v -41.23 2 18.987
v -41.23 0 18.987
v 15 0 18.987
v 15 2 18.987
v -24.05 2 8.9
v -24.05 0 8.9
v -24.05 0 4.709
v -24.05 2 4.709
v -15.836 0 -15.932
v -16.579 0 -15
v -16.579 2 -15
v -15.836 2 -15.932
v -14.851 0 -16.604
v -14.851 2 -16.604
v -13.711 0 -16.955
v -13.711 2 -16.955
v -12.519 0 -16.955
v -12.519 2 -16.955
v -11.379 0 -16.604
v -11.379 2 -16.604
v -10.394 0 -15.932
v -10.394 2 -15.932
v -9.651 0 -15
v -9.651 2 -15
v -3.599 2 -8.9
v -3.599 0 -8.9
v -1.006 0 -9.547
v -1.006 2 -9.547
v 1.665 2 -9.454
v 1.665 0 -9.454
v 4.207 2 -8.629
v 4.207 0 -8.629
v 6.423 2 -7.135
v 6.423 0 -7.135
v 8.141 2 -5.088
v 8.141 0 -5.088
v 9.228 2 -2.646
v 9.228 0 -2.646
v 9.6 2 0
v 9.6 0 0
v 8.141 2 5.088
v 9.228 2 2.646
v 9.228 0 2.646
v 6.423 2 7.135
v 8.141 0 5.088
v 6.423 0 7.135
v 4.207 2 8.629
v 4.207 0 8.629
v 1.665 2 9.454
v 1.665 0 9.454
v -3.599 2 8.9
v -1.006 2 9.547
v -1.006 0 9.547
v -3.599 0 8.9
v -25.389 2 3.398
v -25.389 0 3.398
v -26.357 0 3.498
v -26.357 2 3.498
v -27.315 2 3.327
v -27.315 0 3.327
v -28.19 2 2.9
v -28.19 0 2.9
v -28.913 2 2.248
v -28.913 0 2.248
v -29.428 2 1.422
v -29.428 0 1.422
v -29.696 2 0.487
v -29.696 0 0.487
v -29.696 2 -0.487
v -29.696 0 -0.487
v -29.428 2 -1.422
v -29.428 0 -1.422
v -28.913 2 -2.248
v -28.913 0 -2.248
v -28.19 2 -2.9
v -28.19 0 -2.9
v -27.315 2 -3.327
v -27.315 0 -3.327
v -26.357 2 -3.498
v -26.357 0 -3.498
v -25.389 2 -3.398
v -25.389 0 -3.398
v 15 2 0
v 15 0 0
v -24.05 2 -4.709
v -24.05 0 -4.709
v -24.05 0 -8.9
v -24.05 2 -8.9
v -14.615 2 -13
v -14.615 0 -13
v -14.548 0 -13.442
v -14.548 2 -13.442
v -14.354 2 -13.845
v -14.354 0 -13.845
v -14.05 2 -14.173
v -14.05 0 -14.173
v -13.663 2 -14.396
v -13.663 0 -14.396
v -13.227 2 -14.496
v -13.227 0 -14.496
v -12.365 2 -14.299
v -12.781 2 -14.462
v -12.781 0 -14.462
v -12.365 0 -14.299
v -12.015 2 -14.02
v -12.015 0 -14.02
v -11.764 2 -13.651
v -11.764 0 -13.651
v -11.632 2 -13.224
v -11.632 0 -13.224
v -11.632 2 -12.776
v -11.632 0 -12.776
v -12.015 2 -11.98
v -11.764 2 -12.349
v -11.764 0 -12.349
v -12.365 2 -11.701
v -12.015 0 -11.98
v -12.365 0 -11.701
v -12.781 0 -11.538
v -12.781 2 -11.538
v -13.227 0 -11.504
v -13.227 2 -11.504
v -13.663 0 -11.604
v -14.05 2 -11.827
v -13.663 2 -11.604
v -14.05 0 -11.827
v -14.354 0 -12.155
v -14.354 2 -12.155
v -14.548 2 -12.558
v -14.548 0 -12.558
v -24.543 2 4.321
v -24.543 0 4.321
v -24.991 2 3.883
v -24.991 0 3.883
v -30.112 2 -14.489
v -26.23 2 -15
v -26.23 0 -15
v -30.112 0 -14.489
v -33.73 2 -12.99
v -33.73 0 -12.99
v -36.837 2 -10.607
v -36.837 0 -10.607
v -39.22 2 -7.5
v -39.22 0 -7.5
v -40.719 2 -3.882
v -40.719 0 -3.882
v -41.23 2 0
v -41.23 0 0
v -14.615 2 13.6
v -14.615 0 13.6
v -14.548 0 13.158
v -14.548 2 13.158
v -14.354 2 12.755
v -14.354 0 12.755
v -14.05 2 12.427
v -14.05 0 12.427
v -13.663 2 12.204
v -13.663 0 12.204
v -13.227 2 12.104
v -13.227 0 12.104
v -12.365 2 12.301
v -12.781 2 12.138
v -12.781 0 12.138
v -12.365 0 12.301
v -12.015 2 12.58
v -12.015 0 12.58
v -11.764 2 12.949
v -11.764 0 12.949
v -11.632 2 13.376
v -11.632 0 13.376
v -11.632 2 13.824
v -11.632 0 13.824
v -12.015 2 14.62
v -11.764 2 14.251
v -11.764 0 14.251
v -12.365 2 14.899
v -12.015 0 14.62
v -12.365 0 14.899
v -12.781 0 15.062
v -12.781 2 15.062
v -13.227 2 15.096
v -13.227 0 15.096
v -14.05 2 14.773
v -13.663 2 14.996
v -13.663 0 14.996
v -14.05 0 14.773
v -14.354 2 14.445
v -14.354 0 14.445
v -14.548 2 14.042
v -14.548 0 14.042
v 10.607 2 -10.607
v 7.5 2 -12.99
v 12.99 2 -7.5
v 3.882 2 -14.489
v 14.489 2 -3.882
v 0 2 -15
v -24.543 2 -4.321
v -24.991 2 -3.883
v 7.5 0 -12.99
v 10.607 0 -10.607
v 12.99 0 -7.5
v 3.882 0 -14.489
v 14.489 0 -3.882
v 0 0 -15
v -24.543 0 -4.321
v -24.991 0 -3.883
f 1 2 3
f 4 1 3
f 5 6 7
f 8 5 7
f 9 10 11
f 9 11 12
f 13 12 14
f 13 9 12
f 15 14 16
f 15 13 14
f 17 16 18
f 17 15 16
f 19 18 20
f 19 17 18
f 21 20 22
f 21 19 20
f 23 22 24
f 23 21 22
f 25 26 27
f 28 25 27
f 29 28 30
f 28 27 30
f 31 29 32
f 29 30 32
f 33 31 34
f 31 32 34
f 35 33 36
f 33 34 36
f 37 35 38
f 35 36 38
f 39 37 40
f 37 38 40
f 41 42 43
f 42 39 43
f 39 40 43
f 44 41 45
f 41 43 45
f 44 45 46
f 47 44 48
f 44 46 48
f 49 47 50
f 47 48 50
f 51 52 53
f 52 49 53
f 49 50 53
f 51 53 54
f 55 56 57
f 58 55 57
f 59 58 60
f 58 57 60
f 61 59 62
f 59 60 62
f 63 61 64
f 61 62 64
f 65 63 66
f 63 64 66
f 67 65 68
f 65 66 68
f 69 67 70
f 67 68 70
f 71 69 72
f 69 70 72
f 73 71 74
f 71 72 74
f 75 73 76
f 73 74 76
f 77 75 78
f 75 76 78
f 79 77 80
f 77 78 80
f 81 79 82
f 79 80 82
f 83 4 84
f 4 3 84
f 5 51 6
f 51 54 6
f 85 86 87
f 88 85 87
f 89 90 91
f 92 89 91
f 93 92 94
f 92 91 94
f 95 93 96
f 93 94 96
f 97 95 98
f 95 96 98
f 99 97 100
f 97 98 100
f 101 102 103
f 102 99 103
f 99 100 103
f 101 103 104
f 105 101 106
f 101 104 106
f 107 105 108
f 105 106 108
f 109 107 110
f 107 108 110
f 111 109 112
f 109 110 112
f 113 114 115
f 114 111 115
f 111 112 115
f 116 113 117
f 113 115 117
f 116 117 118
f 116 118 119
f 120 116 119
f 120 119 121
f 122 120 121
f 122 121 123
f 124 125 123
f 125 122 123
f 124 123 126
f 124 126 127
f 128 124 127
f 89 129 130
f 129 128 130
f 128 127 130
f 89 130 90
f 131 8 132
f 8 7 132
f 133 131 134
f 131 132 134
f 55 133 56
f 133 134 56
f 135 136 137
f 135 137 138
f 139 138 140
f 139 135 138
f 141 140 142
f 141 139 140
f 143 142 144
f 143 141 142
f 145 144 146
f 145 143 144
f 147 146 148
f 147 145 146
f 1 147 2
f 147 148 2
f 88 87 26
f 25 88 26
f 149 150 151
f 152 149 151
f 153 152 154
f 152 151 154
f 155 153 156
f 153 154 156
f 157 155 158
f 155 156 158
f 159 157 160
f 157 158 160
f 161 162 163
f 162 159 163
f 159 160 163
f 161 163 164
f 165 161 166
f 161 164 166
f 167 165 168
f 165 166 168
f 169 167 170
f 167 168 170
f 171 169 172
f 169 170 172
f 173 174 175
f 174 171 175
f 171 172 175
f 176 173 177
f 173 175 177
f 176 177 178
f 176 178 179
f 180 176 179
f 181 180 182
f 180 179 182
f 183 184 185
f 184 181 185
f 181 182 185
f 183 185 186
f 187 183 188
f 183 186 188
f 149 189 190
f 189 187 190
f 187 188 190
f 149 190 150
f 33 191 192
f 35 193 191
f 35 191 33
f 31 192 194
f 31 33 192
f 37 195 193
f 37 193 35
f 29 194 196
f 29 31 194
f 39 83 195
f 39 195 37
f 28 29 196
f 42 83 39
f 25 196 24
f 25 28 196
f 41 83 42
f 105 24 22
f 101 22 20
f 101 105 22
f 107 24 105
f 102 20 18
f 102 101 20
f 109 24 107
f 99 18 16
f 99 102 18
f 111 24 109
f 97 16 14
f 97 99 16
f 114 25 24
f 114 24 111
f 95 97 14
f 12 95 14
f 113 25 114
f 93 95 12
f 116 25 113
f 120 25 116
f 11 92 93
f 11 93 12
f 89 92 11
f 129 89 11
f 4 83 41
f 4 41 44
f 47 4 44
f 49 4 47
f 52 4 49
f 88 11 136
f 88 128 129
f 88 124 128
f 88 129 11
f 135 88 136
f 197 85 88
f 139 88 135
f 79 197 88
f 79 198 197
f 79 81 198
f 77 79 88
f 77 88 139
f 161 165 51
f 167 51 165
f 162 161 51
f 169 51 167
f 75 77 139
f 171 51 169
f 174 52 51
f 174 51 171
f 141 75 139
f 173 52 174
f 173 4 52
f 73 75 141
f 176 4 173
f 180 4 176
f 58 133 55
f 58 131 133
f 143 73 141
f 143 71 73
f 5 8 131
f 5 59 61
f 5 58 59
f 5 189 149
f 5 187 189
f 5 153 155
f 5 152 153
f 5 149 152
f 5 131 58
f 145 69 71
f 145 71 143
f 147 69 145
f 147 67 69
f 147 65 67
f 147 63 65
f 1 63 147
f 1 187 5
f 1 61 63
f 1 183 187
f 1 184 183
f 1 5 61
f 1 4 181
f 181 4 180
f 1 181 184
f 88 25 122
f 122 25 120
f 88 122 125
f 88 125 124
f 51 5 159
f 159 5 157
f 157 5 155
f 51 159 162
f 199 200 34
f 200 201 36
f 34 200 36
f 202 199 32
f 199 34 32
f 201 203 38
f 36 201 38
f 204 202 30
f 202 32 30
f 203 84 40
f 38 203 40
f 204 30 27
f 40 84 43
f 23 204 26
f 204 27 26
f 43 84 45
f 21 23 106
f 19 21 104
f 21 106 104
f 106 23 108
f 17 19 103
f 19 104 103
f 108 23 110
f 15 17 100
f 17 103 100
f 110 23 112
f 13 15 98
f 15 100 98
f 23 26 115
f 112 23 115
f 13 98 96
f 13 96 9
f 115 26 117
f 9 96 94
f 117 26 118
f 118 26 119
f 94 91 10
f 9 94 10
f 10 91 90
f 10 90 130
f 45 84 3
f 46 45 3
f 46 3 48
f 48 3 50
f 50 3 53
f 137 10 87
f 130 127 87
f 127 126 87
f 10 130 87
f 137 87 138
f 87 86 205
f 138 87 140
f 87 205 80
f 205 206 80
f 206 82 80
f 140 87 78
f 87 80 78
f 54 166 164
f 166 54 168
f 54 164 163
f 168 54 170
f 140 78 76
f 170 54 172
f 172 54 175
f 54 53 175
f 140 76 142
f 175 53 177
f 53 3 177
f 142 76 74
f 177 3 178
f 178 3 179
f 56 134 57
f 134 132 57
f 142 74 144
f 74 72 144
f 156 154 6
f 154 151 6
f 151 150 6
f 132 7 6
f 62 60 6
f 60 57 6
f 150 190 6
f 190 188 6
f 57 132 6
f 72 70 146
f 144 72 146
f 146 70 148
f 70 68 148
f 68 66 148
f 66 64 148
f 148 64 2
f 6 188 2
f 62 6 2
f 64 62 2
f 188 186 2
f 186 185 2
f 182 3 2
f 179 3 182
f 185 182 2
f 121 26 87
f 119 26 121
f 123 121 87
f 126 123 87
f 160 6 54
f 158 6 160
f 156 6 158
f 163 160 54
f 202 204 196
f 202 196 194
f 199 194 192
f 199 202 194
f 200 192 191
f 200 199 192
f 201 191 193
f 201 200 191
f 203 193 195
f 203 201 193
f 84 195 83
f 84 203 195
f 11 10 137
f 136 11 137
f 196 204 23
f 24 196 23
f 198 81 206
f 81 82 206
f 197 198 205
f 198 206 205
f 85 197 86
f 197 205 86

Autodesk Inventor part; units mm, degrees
ref_plane "YZ Plane" through (0, 0, 0) normal (1, 0, 0) x (0, 1, 0)
ref_plane "XZ Plane" through (0, 0, 0) normal (0, 1, 0) x (-1, 0, 0)
ref_plane "XY Plane" through (0, 0, 0) normal (0, 0, 1) x (1, 0, 0)
sketch "Sketch1" plane through (0, 0, 0) normal (0, 1, 0) x (-1, 0, 0)
  arc A0 (-15, 0) -> (0, -15) centre (0, 0) ccw
  arc A1 (3.5986, 8.9) -> (3.5986, -8.9) centre (0, 0) ccw
  line L0 (24.0501, -8.9) -> (3.5986, -8.9)
  line L1 (0, -15) -> (9.6509, -15)
  arc A2 (9.6509, -15) -> (16.5791, -15) centre (13.115, -13) ccw
  circle A3 centre (13.115, 13.6) radius 1.5
  arc A4 (25.389, 3.3975) -> (24.0501, 4.7088) centre (20.7501, 0) ccw
  arc A5 (25.389, -3.3975) -> (25.389, 3.3975) centre (26.23, 0) ccw
  arc A6 (24.0501, -4.7088) -> (25.389, -3.3975) centre (20.7501, 0) ccw
  line L2 (24.0501, -4.7088) -> (24.0501, -8.9)
  line L3 (24.0501, -8.9) -> (3.5986, -8.9)
  arc A7 (3.5986, 8.9) -> (3.5986, -8.9) centre (0, 0) ccw
  line L4 (3.5986, 8.9) -> (24.0501, 8.9)
  line L5 (24.0501, 8.9) -> (24.0501, 4.7088)
  circle A8 centre (13.115, -13) radius 1.5
  line L6 (0, -15) -> (9.6509, -15)
  arc A9 (9.6509, -15) -> (16.5791, -15) centre (13.115, -13) ccw
  line L7 (16.5791, -15) -> (41.23, -15)
  line L8 (41.23, -15) -> (41.23, 18.9874)
  line L9 (41.23, 18.9874) -> (-15, 18.9874)
  line L10 (-15, 18.9874) -> (-15, 0)
  arc A10 (-15, 0) -> (0, -15) centre (0, 0) ccw
  line L11 (16.5791, -15) -> (41.23, -15)
extrude "Extrusion1" add sketch "Sketch1" along normal blind 2
fillet "Fillet1" radius 15 1 edges at (-41.23, 1, -15)
properties part number "Dock top2 V2" material "Acrylic"
